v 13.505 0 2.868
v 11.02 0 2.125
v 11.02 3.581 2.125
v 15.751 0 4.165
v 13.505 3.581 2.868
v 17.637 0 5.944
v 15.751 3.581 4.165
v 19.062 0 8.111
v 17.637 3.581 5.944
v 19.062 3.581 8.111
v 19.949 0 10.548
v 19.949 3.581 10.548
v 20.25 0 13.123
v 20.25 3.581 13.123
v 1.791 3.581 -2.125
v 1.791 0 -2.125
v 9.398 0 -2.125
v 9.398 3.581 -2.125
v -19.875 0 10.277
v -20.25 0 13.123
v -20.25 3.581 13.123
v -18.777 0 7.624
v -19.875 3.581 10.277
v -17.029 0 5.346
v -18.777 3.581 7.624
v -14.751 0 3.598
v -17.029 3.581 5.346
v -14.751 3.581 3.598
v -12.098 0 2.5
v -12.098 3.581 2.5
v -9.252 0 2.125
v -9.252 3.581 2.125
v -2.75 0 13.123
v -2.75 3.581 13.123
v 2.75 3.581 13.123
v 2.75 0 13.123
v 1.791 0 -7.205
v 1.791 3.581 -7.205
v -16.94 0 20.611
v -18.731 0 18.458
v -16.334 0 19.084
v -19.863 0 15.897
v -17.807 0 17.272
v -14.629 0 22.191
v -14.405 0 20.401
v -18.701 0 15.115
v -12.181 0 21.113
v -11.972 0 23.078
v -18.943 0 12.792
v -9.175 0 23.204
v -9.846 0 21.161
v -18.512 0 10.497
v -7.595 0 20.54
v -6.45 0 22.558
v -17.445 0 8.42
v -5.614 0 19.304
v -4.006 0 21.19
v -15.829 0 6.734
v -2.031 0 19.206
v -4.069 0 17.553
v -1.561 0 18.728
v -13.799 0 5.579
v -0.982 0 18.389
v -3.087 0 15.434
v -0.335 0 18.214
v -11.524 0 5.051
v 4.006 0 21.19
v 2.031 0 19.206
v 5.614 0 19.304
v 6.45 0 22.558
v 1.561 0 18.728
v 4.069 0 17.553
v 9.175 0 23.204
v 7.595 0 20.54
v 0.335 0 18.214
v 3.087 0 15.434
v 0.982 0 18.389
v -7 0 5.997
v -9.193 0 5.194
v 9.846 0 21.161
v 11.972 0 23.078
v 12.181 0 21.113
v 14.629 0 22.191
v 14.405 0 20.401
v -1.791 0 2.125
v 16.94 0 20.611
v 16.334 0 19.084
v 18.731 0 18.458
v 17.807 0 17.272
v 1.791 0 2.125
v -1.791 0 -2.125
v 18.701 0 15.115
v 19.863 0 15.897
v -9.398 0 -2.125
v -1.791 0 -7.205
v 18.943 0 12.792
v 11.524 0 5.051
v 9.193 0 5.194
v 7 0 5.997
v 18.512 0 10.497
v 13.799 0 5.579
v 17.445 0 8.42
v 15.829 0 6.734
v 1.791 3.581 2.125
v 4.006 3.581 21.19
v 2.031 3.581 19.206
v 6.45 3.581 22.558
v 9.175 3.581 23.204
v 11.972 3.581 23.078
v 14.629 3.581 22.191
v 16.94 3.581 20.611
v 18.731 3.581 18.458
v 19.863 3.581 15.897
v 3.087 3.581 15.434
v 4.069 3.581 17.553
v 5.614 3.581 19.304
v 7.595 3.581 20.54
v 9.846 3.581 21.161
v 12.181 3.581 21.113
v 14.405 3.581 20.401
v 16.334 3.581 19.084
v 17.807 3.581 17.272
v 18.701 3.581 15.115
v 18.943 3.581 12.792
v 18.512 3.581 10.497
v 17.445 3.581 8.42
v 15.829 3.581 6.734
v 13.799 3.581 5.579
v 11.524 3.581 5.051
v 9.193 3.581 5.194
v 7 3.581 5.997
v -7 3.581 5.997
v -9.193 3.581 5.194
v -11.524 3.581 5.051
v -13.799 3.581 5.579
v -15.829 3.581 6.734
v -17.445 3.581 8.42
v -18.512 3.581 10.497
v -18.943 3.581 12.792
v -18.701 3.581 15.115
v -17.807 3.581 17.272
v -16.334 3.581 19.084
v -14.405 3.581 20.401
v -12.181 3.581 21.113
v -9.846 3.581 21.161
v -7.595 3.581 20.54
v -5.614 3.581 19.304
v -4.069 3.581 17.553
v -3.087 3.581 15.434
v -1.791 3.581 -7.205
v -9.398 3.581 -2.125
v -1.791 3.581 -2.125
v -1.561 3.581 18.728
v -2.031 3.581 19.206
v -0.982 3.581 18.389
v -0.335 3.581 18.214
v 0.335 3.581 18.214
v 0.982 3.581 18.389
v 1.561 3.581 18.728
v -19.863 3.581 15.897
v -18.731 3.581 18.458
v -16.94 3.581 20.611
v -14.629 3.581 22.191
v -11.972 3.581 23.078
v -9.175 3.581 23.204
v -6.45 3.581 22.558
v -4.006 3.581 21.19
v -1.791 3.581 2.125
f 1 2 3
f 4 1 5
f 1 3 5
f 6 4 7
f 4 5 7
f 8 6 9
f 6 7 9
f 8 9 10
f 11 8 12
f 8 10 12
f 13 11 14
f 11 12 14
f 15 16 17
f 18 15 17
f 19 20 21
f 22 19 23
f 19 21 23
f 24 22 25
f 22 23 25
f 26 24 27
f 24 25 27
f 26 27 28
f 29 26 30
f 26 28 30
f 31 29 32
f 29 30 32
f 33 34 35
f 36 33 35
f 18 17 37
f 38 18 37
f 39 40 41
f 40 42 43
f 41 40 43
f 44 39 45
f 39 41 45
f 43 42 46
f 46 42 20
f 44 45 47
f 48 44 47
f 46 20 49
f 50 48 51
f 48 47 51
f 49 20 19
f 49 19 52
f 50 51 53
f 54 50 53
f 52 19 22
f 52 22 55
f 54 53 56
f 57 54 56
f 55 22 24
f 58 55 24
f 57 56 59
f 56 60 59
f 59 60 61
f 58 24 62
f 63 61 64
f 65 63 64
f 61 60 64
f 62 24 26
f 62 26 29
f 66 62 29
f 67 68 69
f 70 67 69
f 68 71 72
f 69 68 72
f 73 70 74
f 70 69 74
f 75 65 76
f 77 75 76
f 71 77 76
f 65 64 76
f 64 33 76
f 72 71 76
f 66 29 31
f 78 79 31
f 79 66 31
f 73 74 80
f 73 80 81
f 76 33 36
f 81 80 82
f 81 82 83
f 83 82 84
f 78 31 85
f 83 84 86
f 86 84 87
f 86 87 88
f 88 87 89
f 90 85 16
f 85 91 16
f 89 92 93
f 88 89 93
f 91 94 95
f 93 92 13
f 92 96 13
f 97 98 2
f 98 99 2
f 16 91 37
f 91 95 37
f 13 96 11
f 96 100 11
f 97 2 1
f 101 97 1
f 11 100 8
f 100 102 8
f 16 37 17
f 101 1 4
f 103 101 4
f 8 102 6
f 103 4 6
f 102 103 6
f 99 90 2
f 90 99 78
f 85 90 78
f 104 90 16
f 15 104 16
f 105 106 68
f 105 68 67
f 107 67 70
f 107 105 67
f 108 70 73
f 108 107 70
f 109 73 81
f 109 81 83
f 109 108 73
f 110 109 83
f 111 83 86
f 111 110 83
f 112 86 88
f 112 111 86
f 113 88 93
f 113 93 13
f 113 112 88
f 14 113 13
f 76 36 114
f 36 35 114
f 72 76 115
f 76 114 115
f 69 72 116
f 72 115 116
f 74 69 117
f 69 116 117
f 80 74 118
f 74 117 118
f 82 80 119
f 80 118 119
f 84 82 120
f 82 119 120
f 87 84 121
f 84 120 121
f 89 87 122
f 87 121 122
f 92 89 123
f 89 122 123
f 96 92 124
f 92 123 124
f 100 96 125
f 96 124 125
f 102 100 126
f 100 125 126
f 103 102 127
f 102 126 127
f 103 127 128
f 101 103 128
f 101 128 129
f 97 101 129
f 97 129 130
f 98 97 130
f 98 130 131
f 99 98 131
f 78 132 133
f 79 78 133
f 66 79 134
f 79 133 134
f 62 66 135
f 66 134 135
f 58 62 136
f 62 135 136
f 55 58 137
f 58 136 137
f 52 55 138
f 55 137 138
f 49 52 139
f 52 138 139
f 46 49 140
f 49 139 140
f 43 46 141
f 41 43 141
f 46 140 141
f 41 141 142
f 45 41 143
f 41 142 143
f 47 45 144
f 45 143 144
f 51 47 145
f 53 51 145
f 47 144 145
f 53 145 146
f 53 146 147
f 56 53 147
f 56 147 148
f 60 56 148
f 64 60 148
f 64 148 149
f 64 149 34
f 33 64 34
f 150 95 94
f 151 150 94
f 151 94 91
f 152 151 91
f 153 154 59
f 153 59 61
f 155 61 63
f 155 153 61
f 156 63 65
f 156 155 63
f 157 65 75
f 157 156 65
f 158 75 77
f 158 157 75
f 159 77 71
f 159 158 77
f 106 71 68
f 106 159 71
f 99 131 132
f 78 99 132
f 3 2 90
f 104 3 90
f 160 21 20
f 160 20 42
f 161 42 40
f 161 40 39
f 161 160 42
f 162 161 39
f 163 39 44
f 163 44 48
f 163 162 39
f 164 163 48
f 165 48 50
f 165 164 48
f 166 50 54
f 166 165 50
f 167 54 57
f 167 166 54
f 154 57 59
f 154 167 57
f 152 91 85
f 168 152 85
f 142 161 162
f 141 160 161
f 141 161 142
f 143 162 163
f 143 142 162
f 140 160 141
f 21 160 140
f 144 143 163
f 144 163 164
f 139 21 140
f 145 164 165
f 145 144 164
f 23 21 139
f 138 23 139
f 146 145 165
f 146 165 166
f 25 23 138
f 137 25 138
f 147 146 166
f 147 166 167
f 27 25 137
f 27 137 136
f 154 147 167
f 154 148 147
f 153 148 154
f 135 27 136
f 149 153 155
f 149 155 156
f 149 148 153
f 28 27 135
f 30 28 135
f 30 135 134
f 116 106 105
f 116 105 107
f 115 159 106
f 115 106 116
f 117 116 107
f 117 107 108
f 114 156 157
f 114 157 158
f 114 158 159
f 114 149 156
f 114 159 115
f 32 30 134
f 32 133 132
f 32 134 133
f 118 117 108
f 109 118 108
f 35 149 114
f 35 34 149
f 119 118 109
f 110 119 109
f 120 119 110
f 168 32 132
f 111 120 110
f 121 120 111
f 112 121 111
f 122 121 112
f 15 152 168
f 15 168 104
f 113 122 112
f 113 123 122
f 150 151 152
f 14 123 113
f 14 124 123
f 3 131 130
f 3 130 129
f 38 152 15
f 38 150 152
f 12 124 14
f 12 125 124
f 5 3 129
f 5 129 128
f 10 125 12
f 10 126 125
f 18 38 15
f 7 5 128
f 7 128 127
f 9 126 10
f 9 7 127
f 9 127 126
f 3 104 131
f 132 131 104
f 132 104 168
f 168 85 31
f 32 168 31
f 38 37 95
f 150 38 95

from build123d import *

# Parameters (mm, degrees)
BOSS_EXTRUDE1_DEPTH = 3.5814
BOSS_EXTRUDE2_DEPTH = 3.5814
SKETCH4_R           = 8.1
CUT_EXTRUDE2_DEPTH  = 4.5814
CUT_EXTRUDE4_REACH  = 5.581
CUT_EXTRUDE5_REACH  = 5.581


with BuildPart() as part:
    # Sketch1 → Boss-Extrude1 (new body)
    with BuildSketch(Plane(origin=(0, 0, 0), x_dir=(1, 0, 0), z_dir=(0, 1, 0))):
        Polygon((-20.25, -13.1232), (20.25, -13.1232), (20.25, -2.125), (1.7907, -2.125), (1.7907, 2.125), (9.398, 2.125), (1.7907, 7.205), (-1.7907, 7.205), (-9.398, 2.125), (-1.7907, 2.125), (-1.7907, -2.125), (-20.25, -2.125), align=None)
    extrude(amount=BOSS_EXTRUDE1_DEPTH)

    # Sketch3 → Boss-Extrude2 (add)
    with BuildSketch(Plane(origin=(0, 3.5814, 0), x_dir=(1, 0, 0), z_dir=(0, 1, 0))):
        Polygon((-20.25, -2.125), (-20.25, -13.1232), (20.25, -13.1232), (20.25, -2.125), (1.7907, -2.125), (1.7907, 2.125), (9.398, 2.125), (1.7907, 7.205), (-1.7907, 7.205), (-9.398, 2.125), (-1.7907, 2.125), (-1.7907, -2.125), align=None)
        with BuildLine():
            Line((20.25, -13.1232), (-20.25, -13.1232))
            ThreePointArc((-20.25, -13.1232), (-13.331227209, -22.72714357), (-2.030596131, -19.205654357))
            ThreePointArc((-2.030596131, -19.205654357), (0, -18.191524388), (2.030596131, -19.205654357))
            ThreePointArc((2.030596131, -19.205654357), (13.331227209, -22.72714357), (20.25, -13.1232))
        make_face()
    extrude(amount=-BOSS_EXTRUDE2_DEPTH)

    # Sketch4 → Cut-Extrude2 (cut, through all)
    with BuildSketch(Plane(origin=(0, 3.5814, 0), x_dir=(1, 0, 0), z_dir=(0, 1, 0))):
        with Locations((-10.85, -13.1232)):
            Circle(SKETCH4_R)
        with Locations((10.85, -13.1232)):
            Circle(SKETCH4_R)
    extrude(amount=-CUT_EXTRUDE2_DEPTH, mode=Mode.SUBTRACT)

    # Sketch5 → Cut-Extrude4 (cut, up to next)
    with BuildSketch(Plane(origin=(0, 3.5814, 0), x_dir=(1, 0, 0), z_dir=(0, 1, 0)), mode=Mode.PRIVATE) as cut_extrude4_sk1:
        with BuildLine():
            Line((7, -5.996665078), (-7, -5.996665078))
            ThreePointArc((-7, -5.996665078), (-3.893168825, -8.974404994), (-2.75, -13.1232))
            Line((-2.75, -13.1232), (2.75, -13.1232))
            ThreePointArc((2.75, -13.1232), (3.893168825, -8.974404994), (7, -5.996665078))
        make_face()
    cut_extrude4_tool1 = extrude(cut_extrude4_sk1.sketch, amount=-CUT_EXTRUDE4_REACH, mode=Mode.PRIVATE) & part.part
    add(cut_extrude4_tool1.solids().sort_by_distance((0, 3.5814, 8.978273))[0], mode=Mode.SUBTRACT)

    # Sketch6 → Cut-Extrude5 (cut, up to next)
    with BuildSketch(Plane(origin=(0, 3.5814, 0), x_dir=(1, 0, 0), z_dir=(0, 1, 0)), mode=Mode.PRIVATE) as cut_extrude5_sk1:
        with BuildLine():
            Line((-9.2518, -2.125), (-20.25, -2.125))
            Line((-20.25, -2.125), (-20.25, -13.1232))
            ThreePointArc((-20.25, -13.1232), (-17.028701801, -5.346298199), (-9.2518, -2.125))
        make_face()
    cut_extrude5_tool1 = extrude(cut_extrude5_sk1.sketch, amount=-CUT_EXTRUDE5_REACH, mode=Mode.PRIVATE) & part.part
    add(cut_extrude5_tool1.solids().sort_by_distance((-17.793355, 3.5814, 4.581645))[0], mode=Mode.SUBTRACT)
    # Sketch6 → Cut-Extrude5 (cut, up to next)
    with BuildSketch(Plane(origin=(0, 3.5814, 0), x_dir=(1, 0, 0), z_dir=(0, 1, 0)), mode=Mode.PRIVATE) as cut_extrude5_sk2:
        with BuildLine():
            Line((20.25, -13.1232), (20.25, -2.125))
            Line((20.25, -2.125), (11.02035, -2.125))
            ThreePointArc((11.02035, -2.125), (17.636860555, -5.94429266), (20.25, -13.1232))
        make_face()
    cut_extrude5_tool2 = extrude(cut_extrude5_sk2.sketch, amount=-CUT_EXTRUDE5_REACH, mode=Mode.PRIVATE) & part.part
    add(cut_extrude5_tool2.solids().sort_by_distance((17.919058, 3.5814, 4.610875))[0], mode=Mode.SUBTRACT)


solid = part.part
